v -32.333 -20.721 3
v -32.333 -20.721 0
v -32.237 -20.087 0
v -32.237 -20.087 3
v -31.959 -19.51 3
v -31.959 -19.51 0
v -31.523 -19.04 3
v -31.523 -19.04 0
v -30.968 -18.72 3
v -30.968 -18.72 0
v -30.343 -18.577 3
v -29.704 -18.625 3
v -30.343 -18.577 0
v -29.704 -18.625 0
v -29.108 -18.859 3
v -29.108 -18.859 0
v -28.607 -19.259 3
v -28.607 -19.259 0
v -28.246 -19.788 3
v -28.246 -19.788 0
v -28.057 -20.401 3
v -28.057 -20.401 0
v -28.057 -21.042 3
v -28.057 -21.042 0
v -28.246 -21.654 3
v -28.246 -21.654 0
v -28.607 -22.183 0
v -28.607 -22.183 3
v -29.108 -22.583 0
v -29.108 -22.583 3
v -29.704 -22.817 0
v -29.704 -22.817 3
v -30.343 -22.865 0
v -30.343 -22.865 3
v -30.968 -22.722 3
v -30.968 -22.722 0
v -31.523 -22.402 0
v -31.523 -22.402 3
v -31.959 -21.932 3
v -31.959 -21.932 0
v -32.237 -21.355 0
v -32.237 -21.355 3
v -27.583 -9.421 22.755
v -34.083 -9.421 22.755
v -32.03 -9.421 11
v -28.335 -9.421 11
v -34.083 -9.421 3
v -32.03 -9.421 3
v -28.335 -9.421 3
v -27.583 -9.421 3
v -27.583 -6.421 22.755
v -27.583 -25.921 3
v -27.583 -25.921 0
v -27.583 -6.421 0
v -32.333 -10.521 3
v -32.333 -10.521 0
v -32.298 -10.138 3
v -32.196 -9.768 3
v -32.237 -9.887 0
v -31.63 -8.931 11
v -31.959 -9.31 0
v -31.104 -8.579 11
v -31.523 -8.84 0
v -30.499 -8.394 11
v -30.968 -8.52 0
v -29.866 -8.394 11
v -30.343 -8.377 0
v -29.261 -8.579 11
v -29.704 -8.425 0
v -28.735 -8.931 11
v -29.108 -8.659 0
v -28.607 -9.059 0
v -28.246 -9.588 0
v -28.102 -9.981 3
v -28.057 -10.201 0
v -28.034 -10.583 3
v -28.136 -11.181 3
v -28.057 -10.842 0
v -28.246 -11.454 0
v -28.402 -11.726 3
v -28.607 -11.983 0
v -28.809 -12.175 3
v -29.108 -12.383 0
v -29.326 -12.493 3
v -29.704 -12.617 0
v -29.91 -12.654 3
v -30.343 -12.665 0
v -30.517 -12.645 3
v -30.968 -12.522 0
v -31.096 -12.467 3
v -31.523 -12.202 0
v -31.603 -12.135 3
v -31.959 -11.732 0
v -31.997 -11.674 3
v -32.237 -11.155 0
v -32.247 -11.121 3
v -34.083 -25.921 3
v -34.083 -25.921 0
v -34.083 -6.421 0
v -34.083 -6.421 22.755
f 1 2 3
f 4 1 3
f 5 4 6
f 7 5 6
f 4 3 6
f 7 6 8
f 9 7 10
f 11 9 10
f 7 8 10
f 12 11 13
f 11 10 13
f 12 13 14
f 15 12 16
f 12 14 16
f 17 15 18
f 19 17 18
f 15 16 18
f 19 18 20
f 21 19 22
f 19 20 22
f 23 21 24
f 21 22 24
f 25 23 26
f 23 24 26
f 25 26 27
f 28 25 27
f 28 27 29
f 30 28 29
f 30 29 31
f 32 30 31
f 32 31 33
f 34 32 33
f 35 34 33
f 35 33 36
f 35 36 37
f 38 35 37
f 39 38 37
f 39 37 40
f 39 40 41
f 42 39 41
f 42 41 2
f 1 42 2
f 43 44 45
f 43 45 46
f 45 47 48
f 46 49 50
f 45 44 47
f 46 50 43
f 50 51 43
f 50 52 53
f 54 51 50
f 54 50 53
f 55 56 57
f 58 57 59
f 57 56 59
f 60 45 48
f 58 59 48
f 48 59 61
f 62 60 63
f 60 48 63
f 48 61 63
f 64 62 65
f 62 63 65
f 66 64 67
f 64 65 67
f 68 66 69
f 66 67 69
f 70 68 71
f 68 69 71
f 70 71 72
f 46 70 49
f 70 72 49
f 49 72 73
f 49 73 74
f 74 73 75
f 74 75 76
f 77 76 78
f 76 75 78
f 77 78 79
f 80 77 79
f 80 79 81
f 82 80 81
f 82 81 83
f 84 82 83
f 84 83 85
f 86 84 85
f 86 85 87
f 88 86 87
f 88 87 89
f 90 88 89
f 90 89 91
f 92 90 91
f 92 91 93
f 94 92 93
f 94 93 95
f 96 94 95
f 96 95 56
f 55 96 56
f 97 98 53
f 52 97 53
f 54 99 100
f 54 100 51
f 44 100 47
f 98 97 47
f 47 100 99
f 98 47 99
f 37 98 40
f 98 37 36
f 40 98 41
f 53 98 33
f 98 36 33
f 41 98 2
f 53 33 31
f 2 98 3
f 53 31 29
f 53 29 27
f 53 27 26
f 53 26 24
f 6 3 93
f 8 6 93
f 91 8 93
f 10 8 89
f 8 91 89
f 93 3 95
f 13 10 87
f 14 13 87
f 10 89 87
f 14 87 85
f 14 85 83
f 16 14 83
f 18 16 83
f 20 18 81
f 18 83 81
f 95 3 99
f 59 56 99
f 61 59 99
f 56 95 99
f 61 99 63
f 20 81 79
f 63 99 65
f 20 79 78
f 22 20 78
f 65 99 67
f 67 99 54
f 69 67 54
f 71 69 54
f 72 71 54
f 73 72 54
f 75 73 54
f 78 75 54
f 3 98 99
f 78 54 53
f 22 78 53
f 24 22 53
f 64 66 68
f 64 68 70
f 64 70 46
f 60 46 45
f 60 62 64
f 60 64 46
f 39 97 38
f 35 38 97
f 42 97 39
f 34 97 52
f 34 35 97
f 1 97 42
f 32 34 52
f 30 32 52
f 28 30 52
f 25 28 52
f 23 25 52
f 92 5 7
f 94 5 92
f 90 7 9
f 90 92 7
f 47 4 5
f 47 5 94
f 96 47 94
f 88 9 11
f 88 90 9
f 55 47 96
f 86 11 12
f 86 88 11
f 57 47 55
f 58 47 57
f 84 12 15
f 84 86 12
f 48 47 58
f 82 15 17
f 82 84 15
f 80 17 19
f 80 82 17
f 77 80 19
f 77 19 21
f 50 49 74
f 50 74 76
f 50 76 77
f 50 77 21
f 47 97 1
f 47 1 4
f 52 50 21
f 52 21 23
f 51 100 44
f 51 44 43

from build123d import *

# Parameters (mm, degrees)
SKETCH1_W           = 6.5
SKETCH1_H           = 19.5
BOSS_EXTRUDE1_DEPTH = 3
SKETCH6_W           = 6.5
SKETCH6_H           = 19.754729726
BOSS_EXTRUDE2_DEPTH = 3
SKETCH7_R           = 2.15
CUT_EXTRUDE1_DEPTH  = 11


with BuildPart() as part:
    # Sketch1 → Boss-Extrude1 (new body)
    with BuildSketch(Plane.XY):
        with Locations((-30.832629628, -16.171363726)):
            Rectangle(SKETCH1_W, SKETCH1_H)
    extrude(amount=BOSS_EXTRUDE1_DEPTH)

    # Sketch6 → Boss-Extrude2 (add)
    with BuildSketch(Plane(origin=(0, -6.421363726, 0), x_dir=(1, 0, 0), z_dir=(0, 1, 0))):
        with Locations((-30.832629628, -12.877364863)):
            Rectangle(SKETCH6_W, SKETCH6_H)
    extrude(amount=-BOSS_EXTRUDE2_DEPTH)

    # Sketch7 → Cut-Extrude1 (cut)
    with BuildSketch(Plane(origin=(0, 0, 0), x_dir=(-1, 0, 0), z_dir=(0, 0, -1))):
        with Locations((30.182629628, -10.521084151)):
            Circle(SKETCH7_R)
        with Locations((30.182629628, -20.721084151)):
            Circle(SKETCH7_R)
    extrude(amount=-CUT_EXTRUDE1_DEPTH, mode=Mode.SUBTRACT)


solid = part.part
